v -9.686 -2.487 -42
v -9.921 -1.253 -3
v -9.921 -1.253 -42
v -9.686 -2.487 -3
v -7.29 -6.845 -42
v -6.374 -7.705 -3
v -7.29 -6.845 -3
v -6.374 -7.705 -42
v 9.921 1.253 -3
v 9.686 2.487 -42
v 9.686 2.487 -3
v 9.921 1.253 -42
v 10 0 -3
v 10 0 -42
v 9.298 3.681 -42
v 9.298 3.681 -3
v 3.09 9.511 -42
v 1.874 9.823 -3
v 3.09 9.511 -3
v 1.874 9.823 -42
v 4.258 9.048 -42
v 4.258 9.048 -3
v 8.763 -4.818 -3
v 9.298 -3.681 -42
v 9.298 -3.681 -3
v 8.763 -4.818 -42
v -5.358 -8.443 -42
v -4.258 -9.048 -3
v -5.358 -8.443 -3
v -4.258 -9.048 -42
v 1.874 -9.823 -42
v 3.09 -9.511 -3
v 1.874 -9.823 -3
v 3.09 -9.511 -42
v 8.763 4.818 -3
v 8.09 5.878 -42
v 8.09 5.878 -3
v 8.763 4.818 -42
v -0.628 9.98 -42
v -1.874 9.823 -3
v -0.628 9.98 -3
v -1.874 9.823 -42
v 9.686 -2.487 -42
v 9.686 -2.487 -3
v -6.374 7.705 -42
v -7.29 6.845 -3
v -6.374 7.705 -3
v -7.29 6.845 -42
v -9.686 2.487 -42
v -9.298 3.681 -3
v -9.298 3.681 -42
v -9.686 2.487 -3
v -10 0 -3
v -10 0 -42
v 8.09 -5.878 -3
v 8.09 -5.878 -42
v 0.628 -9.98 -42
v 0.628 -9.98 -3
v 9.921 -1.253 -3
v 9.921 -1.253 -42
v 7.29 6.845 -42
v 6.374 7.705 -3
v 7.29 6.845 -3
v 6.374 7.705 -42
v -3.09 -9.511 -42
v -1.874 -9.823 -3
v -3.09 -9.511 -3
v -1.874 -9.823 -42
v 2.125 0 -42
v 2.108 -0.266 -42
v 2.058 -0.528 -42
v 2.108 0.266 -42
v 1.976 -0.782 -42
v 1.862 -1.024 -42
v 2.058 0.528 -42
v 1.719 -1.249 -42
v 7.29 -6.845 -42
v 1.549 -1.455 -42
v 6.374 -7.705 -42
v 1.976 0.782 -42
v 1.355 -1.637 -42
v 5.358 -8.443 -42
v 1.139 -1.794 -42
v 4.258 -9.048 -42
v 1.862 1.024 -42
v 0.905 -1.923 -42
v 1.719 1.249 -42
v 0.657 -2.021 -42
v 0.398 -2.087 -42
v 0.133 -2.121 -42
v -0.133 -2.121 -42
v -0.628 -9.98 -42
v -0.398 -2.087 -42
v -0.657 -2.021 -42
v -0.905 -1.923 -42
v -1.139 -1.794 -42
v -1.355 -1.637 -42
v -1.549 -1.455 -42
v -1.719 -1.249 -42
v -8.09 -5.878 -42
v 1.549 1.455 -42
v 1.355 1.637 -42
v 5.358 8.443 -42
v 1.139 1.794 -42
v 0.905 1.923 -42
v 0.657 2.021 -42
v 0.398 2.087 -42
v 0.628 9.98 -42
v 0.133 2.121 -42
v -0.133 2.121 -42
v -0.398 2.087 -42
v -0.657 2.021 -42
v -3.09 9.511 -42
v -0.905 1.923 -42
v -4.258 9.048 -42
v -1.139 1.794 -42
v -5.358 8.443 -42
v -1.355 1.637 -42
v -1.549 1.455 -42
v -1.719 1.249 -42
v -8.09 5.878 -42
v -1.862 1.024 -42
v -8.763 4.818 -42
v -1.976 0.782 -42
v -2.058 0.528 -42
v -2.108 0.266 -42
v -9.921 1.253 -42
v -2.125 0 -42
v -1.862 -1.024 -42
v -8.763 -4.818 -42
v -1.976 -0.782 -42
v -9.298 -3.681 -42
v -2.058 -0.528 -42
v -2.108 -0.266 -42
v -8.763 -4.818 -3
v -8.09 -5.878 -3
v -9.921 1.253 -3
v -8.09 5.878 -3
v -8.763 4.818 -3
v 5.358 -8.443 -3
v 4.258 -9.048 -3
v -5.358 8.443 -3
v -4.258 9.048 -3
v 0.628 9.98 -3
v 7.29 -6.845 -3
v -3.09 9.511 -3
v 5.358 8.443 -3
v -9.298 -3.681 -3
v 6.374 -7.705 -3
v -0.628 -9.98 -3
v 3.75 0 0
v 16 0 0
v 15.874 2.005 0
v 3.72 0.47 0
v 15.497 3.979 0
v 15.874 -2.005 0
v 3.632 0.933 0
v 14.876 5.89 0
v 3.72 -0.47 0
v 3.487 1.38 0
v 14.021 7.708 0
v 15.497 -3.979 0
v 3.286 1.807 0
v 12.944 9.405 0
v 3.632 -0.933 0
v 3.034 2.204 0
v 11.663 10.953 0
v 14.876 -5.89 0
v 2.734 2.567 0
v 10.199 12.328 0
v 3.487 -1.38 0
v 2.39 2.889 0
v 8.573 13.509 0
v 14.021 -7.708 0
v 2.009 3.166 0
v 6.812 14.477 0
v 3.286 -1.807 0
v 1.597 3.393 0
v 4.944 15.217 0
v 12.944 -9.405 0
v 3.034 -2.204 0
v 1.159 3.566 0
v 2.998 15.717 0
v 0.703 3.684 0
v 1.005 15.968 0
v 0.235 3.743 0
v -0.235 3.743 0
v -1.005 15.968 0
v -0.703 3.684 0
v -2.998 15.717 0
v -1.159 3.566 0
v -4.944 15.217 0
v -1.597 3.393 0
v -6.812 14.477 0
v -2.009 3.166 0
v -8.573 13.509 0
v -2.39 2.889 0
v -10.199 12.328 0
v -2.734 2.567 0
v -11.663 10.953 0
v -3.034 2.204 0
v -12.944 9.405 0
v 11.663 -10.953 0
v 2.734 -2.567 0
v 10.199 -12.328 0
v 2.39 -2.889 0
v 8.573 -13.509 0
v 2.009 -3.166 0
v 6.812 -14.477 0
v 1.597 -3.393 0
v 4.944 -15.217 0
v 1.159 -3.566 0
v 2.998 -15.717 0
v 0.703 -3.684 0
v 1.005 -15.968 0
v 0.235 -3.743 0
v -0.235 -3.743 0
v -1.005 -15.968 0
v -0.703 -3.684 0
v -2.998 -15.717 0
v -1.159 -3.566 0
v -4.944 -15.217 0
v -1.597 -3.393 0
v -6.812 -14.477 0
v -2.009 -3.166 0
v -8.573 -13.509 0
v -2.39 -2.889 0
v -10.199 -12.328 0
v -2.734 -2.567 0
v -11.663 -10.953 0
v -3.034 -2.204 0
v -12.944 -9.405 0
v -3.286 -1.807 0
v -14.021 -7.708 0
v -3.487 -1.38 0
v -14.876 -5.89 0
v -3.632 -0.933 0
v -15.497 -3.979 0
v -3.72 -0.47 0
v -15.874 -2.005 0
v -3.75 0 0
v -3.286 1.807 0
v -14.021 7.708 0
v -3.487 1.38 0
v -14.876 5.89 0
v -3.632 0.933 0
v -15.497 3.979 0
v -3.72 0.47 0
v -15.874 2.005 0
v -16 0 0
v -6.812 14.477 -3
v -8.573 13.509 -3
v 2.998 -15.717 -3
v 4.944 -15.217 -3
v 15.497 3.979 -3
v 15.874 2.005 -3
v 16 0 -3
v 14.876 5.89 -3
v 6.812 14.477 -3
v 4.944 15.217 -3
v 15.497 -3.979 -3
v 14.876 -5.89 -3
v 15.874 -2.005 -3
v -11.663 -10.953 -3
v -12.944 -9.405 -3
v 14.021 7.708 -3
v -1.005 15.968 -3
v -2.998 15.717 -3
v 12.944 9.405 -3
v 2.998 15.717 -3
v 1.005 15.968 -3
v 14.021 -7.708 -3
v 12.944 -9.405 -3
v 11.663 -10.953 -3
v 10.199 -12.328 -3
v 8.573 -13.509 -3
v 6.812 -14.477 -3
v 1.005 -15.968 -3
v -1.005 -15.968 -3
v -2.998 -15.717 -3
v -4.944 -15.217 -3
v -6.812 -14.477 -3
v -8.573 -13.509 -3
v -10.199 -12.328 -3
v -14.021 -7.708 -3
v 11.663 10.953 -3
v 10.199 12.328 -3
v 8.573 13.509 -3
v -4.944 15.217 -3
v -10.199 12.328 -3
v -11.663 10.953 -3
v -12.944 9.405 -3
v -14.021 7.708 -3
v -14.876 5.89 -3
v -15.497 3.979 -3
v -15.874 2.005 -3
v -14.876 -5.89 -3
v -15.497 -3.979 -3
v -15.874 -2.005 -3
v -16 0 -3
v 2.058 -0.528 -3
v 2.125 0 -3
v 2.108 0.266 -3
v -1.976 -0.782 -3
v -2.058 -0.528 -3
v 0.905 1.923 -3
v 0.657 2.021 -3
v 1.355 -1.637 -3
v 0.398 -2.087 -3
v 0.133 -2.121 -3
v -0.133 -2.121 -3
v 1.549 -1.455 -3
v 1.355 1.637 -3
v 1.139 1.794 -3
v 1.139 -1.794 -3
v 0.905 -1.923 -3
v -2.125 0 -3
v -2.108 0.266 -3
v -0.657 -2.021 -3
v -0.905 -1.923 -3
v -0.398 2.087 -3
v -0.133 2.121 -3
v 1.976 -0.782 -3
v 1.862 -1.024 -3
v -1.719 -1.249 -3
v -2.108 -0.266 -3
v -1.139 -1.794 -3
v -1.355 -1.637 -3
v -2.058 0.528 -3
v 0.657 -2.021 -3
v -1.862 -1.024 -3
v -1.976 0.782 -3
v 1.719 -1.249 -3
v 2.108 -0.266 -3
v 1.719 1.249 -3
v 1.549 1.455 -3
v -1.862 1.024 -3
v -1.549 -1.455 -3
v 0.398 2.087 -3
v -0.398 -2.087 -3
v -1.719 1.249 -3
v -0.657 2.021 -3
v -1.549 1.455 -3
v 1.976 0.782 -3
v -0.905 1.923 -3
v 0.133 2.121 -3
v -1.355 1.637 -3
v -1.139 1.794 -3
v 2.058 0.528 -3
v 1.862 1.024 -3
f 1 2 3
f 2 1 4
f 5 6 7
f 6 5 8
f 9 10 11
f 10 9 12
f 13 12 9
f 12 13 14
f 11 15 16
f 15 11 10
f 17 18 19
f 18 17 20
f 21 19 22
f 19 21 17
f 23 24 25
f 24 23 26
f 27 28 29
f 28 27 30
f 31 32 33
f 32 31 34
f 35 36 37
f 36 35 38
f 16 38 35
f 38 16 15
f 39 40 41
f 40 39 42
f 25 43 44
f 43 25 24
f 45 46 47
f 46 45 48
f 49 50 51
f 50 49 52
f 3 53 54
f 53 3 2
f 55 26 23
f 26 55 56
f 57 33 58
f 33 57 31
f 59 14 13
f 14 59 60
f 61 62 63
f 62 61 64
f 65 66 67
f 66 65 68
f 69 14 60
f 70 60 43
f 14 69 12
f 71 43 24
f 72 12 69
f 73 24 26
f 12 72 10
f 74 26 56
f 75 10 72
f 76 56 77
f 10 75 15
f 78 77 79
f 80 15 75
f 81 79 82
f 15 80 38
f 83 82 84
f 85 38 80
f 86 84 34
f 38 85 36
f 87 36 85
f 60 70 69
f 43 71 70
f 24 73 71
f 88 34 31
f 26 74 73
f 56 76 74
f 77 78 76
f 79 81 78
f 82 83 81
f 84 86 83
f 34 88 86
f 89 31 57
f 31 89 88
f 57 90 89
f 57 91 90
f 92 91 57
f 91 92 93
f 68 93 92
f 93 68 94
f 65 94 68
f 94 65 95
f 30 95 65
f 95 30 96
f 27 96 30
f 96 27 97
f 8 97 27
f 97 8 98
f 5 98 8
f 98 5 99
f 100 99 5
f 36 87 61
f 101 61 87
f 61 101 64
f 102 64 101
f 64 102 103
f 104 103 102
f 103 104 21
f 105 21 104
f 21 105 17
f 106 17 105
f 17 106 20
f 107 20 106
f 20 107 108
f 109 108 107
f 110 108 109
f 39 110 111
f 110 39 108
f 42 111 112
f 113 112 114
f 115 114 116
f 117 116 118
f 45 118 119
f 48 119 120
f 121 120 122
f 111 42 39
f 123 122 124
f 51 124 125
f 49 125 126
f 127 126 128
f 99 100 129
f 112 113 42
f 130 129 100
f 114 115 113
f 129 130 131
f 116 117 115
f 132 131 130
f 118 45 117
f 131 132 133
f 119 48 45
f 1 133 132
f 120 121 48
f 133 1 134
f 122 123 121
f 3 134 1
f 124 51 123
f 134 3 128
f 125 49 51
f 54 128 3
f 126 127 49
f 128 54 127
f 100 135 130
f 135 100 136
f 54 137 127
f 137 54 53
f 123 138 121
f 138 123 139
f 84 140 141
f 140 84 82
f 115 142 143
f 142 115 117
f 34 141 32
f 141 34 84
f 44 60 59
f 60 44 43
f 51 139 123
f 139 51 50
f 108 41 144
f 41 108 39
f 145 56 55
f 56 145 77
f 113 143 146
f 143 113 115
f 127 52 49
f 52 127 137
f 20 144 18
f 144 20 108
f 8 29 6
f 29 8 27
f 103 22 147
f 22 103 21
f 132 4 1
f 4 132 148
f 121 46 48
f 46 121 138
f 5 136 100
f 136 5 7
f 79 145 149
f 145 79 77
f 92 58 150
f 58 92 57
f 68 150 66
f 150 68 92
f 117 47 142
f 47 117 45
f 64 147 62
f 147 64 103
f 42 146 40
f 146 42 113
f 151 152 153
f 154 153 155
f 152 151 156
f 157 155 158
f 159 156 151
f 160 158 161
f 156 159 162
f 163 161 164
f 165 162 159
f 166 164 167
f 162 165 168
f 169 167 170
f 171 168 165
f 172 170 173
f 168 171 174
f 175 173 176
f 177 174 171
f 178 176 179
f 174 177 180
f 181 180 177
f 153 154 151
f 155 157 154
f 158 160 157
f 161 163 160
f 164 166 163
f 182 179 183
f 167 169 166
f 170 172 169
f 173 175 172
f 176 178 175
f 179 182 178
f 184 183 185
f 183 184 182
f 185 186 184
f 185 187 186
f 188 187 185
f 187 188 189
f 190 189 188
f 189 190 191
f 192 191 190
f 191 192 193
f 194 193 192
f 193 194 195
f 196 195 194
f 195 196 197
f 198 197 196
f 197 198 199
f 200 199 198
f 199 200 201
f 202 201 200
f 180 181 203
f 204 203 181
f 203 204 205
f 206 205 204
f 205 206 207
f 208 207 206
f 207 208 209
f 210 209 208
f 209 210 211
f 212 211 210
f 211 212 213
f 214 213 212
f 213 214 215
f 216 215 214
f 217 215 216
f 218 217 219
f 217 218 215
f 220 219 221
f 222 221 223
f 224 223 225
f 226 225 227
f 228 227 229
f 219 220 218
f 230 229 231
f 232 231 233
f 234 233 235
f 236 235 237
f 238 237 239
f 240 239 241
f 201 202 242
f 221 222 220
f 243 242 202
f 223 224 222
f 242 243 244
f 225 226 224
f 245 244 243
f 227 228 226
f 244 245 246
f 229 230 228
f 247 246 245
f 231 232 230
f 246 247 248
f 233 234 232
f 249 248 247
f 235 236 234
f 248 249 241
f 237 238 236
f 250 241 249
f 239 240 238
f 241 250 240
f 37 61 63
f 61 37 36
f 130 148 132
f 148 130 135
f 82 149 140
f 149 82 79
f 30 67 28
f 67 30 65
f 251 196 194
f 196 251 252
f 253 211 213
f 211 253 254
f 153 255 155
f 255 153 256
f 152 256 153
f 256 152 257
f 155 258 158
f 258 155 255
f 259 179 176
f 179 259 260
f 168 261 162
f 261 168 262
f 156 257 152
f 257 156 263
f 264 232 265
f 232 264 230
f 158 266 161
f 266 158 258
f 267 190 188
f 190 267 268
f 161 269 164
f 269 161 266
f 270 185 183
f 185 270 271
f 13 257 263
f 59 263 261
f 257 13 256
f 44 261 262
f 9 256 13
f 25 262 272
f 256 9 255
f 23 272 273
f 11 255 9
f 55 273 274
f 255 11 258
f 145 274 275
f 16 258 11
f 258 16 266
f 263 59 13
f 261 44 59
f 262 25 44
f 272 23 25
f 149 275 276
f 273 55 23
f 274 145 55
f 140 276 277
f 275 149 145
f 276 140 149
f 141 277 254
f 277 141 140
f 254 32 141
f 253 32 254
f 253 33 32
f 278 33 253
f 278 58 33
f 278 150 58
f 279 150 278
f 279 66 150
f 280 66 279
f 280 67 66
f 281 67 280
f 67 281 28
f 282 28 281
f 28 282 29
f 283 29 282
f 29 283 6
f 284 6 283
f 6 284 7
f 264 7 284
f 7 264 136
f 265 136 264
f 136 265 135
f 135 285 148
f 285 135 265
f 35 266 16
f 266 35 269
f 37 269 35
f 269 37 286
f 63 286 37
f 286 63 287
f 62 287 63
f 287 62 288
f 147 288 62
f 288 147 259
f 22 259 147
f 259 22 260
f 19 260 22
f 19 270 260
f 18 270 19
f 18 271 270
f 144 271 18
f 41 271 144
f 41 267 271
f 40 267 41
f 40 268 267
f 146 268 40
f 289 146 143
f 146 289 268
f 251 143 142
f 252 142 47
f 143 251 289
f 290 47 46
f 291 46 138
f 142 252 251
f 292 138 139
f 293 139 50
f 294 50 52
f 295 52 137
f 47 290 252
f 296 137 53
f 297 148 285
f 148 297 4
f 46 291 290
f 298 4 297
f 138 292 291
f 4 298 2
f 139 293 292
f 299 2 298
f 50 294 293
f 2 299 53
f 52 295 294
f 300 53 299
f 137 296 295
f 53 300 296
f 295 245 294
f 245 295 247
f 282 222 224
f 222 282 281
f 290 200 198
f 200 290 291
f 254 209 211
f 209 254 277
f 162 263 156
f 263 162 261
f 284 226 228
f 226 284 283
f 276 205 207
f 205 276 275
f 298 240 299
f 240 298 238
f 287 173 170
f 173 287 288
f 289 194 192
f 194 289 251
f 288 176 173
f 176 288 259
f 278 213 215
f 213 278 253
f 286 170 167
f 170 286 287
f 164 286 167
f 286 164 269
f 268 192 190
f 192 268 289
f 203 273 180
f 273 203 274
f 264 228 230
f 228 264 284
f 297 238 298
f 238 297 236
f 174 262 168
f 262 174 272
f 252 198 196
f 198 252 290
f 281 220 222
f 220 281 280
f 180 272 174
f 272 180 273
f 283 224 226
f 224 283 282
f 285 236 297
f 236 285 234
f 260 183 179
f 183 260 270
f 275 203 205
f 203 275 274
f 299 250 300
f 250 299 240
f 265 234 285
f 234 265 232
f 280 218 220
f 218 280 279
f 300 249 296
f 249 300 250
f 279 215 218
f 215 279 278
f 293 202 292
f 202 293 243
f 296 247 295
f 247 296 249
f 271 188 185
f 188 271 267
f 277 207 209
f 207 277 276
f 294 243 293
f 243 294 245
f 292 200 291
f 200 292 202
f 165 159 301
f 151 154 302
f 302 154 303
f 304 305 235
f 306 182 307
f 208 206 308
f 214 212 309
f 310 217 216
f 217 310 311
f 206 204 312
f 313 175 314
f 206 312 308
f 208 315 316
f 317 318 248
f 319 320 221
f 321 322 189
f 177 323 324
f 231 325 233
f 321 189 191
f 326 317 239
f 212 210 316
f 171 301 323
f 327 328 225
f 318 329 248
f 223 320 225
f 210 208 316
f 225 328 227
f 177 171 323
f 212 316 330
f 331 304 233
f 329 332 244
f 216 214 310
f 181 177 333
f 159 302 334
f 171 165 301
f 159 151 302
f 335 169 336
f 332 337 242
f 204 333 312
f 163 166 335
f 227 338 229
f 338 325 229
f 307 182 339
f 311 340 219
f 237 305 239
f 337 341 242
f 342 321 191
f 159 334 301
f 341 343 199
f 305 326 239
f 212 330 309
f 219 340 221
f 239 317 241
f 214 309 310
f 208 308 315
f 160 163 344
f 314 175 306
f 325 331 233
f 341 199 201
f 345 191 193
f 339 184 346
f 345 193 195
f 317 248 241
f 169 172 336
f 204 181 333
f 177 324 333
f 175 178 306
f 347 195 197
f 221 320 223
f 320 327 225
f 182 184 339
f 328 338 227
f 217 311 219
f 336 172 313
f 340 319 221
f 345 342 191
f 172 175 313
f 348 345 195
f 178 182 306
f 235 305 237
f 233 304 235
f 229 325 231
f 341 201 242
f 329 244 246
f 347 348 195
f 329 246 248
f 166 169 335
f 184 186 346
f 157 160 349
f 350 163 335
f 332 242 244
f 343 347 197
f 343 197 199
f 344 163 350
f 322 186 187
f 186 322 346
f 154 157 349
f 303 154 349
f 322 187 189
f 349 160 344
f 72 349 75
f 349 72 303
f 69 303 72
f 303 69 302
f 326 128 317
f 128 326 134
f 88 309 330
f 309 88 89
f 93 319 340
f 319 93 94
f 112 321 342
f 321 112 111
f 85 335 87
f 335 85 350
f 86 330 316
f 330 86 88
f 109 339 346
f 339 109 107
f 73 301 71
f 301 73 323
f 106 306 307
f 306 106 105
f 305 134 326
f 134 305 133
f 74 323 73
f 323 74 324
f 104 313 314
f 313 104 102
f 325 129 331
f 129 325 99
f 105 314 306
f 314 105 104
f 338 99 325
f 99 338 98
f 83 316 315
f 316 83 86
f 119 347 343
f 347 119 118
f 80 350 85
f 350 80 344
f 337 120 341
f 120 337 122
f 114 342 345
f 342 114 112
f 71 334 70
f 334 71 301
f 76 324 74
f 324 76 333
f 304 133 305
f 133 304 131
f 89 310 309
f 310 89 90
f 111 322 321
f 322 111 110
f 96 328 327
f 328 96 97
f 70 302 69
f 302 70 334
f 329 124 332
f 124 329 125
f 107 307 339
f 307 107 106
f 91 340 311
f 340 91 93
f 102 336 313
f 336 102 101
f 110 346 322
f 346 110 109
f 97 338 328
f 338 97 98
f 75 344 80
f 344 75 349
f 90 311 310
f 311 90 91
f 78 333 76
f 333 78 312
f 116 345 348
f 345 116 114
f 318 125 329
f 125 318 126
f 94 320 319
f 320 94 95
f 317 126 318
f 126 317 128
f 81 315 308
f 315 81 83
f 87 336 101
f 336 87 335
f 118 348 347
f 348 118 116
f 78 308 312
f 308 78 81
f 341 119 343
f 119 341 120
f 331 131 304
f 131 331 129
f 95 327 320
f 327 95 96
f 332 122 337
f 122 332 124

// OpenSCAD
$fn = 50;


difference() {
	union() {
		translate(v = [0, 0, -42.0000000000]) {
			cylinder(h = 42, r = 10.0000000000);
		}
		translate(v = [0, 0, -3.0000000000]) {
			cylinder(h = 3, r = 16.0000000000);
		}
	}
	union() {
		translate(v = [0, 0, 0]) {
			rotate(a = [0, 0, 0]) {
				difference() {
					union() {
						#translate(v = [0, 0, -42.0000000000]) {
							cylinder(h = 42, r = 2.0000000000);
						}
						#translate(v = [0, 0, -3]) {
							cylinder(h = 3, r = 10.0000000000, r1 = 2.1250000000, r2 = 3.7500000000);
						}
						#translate(v = [0, 0, -42.0000000000]) {
							cylinder(h = 42, r = 2.1250000000);
						}
						#translate(v = [0, 0, -42.0000000000]) {
							cylinder(h = 42, r = 2.0000000000);
						}
					}
					union();
				}
			}
		}
	}
}
